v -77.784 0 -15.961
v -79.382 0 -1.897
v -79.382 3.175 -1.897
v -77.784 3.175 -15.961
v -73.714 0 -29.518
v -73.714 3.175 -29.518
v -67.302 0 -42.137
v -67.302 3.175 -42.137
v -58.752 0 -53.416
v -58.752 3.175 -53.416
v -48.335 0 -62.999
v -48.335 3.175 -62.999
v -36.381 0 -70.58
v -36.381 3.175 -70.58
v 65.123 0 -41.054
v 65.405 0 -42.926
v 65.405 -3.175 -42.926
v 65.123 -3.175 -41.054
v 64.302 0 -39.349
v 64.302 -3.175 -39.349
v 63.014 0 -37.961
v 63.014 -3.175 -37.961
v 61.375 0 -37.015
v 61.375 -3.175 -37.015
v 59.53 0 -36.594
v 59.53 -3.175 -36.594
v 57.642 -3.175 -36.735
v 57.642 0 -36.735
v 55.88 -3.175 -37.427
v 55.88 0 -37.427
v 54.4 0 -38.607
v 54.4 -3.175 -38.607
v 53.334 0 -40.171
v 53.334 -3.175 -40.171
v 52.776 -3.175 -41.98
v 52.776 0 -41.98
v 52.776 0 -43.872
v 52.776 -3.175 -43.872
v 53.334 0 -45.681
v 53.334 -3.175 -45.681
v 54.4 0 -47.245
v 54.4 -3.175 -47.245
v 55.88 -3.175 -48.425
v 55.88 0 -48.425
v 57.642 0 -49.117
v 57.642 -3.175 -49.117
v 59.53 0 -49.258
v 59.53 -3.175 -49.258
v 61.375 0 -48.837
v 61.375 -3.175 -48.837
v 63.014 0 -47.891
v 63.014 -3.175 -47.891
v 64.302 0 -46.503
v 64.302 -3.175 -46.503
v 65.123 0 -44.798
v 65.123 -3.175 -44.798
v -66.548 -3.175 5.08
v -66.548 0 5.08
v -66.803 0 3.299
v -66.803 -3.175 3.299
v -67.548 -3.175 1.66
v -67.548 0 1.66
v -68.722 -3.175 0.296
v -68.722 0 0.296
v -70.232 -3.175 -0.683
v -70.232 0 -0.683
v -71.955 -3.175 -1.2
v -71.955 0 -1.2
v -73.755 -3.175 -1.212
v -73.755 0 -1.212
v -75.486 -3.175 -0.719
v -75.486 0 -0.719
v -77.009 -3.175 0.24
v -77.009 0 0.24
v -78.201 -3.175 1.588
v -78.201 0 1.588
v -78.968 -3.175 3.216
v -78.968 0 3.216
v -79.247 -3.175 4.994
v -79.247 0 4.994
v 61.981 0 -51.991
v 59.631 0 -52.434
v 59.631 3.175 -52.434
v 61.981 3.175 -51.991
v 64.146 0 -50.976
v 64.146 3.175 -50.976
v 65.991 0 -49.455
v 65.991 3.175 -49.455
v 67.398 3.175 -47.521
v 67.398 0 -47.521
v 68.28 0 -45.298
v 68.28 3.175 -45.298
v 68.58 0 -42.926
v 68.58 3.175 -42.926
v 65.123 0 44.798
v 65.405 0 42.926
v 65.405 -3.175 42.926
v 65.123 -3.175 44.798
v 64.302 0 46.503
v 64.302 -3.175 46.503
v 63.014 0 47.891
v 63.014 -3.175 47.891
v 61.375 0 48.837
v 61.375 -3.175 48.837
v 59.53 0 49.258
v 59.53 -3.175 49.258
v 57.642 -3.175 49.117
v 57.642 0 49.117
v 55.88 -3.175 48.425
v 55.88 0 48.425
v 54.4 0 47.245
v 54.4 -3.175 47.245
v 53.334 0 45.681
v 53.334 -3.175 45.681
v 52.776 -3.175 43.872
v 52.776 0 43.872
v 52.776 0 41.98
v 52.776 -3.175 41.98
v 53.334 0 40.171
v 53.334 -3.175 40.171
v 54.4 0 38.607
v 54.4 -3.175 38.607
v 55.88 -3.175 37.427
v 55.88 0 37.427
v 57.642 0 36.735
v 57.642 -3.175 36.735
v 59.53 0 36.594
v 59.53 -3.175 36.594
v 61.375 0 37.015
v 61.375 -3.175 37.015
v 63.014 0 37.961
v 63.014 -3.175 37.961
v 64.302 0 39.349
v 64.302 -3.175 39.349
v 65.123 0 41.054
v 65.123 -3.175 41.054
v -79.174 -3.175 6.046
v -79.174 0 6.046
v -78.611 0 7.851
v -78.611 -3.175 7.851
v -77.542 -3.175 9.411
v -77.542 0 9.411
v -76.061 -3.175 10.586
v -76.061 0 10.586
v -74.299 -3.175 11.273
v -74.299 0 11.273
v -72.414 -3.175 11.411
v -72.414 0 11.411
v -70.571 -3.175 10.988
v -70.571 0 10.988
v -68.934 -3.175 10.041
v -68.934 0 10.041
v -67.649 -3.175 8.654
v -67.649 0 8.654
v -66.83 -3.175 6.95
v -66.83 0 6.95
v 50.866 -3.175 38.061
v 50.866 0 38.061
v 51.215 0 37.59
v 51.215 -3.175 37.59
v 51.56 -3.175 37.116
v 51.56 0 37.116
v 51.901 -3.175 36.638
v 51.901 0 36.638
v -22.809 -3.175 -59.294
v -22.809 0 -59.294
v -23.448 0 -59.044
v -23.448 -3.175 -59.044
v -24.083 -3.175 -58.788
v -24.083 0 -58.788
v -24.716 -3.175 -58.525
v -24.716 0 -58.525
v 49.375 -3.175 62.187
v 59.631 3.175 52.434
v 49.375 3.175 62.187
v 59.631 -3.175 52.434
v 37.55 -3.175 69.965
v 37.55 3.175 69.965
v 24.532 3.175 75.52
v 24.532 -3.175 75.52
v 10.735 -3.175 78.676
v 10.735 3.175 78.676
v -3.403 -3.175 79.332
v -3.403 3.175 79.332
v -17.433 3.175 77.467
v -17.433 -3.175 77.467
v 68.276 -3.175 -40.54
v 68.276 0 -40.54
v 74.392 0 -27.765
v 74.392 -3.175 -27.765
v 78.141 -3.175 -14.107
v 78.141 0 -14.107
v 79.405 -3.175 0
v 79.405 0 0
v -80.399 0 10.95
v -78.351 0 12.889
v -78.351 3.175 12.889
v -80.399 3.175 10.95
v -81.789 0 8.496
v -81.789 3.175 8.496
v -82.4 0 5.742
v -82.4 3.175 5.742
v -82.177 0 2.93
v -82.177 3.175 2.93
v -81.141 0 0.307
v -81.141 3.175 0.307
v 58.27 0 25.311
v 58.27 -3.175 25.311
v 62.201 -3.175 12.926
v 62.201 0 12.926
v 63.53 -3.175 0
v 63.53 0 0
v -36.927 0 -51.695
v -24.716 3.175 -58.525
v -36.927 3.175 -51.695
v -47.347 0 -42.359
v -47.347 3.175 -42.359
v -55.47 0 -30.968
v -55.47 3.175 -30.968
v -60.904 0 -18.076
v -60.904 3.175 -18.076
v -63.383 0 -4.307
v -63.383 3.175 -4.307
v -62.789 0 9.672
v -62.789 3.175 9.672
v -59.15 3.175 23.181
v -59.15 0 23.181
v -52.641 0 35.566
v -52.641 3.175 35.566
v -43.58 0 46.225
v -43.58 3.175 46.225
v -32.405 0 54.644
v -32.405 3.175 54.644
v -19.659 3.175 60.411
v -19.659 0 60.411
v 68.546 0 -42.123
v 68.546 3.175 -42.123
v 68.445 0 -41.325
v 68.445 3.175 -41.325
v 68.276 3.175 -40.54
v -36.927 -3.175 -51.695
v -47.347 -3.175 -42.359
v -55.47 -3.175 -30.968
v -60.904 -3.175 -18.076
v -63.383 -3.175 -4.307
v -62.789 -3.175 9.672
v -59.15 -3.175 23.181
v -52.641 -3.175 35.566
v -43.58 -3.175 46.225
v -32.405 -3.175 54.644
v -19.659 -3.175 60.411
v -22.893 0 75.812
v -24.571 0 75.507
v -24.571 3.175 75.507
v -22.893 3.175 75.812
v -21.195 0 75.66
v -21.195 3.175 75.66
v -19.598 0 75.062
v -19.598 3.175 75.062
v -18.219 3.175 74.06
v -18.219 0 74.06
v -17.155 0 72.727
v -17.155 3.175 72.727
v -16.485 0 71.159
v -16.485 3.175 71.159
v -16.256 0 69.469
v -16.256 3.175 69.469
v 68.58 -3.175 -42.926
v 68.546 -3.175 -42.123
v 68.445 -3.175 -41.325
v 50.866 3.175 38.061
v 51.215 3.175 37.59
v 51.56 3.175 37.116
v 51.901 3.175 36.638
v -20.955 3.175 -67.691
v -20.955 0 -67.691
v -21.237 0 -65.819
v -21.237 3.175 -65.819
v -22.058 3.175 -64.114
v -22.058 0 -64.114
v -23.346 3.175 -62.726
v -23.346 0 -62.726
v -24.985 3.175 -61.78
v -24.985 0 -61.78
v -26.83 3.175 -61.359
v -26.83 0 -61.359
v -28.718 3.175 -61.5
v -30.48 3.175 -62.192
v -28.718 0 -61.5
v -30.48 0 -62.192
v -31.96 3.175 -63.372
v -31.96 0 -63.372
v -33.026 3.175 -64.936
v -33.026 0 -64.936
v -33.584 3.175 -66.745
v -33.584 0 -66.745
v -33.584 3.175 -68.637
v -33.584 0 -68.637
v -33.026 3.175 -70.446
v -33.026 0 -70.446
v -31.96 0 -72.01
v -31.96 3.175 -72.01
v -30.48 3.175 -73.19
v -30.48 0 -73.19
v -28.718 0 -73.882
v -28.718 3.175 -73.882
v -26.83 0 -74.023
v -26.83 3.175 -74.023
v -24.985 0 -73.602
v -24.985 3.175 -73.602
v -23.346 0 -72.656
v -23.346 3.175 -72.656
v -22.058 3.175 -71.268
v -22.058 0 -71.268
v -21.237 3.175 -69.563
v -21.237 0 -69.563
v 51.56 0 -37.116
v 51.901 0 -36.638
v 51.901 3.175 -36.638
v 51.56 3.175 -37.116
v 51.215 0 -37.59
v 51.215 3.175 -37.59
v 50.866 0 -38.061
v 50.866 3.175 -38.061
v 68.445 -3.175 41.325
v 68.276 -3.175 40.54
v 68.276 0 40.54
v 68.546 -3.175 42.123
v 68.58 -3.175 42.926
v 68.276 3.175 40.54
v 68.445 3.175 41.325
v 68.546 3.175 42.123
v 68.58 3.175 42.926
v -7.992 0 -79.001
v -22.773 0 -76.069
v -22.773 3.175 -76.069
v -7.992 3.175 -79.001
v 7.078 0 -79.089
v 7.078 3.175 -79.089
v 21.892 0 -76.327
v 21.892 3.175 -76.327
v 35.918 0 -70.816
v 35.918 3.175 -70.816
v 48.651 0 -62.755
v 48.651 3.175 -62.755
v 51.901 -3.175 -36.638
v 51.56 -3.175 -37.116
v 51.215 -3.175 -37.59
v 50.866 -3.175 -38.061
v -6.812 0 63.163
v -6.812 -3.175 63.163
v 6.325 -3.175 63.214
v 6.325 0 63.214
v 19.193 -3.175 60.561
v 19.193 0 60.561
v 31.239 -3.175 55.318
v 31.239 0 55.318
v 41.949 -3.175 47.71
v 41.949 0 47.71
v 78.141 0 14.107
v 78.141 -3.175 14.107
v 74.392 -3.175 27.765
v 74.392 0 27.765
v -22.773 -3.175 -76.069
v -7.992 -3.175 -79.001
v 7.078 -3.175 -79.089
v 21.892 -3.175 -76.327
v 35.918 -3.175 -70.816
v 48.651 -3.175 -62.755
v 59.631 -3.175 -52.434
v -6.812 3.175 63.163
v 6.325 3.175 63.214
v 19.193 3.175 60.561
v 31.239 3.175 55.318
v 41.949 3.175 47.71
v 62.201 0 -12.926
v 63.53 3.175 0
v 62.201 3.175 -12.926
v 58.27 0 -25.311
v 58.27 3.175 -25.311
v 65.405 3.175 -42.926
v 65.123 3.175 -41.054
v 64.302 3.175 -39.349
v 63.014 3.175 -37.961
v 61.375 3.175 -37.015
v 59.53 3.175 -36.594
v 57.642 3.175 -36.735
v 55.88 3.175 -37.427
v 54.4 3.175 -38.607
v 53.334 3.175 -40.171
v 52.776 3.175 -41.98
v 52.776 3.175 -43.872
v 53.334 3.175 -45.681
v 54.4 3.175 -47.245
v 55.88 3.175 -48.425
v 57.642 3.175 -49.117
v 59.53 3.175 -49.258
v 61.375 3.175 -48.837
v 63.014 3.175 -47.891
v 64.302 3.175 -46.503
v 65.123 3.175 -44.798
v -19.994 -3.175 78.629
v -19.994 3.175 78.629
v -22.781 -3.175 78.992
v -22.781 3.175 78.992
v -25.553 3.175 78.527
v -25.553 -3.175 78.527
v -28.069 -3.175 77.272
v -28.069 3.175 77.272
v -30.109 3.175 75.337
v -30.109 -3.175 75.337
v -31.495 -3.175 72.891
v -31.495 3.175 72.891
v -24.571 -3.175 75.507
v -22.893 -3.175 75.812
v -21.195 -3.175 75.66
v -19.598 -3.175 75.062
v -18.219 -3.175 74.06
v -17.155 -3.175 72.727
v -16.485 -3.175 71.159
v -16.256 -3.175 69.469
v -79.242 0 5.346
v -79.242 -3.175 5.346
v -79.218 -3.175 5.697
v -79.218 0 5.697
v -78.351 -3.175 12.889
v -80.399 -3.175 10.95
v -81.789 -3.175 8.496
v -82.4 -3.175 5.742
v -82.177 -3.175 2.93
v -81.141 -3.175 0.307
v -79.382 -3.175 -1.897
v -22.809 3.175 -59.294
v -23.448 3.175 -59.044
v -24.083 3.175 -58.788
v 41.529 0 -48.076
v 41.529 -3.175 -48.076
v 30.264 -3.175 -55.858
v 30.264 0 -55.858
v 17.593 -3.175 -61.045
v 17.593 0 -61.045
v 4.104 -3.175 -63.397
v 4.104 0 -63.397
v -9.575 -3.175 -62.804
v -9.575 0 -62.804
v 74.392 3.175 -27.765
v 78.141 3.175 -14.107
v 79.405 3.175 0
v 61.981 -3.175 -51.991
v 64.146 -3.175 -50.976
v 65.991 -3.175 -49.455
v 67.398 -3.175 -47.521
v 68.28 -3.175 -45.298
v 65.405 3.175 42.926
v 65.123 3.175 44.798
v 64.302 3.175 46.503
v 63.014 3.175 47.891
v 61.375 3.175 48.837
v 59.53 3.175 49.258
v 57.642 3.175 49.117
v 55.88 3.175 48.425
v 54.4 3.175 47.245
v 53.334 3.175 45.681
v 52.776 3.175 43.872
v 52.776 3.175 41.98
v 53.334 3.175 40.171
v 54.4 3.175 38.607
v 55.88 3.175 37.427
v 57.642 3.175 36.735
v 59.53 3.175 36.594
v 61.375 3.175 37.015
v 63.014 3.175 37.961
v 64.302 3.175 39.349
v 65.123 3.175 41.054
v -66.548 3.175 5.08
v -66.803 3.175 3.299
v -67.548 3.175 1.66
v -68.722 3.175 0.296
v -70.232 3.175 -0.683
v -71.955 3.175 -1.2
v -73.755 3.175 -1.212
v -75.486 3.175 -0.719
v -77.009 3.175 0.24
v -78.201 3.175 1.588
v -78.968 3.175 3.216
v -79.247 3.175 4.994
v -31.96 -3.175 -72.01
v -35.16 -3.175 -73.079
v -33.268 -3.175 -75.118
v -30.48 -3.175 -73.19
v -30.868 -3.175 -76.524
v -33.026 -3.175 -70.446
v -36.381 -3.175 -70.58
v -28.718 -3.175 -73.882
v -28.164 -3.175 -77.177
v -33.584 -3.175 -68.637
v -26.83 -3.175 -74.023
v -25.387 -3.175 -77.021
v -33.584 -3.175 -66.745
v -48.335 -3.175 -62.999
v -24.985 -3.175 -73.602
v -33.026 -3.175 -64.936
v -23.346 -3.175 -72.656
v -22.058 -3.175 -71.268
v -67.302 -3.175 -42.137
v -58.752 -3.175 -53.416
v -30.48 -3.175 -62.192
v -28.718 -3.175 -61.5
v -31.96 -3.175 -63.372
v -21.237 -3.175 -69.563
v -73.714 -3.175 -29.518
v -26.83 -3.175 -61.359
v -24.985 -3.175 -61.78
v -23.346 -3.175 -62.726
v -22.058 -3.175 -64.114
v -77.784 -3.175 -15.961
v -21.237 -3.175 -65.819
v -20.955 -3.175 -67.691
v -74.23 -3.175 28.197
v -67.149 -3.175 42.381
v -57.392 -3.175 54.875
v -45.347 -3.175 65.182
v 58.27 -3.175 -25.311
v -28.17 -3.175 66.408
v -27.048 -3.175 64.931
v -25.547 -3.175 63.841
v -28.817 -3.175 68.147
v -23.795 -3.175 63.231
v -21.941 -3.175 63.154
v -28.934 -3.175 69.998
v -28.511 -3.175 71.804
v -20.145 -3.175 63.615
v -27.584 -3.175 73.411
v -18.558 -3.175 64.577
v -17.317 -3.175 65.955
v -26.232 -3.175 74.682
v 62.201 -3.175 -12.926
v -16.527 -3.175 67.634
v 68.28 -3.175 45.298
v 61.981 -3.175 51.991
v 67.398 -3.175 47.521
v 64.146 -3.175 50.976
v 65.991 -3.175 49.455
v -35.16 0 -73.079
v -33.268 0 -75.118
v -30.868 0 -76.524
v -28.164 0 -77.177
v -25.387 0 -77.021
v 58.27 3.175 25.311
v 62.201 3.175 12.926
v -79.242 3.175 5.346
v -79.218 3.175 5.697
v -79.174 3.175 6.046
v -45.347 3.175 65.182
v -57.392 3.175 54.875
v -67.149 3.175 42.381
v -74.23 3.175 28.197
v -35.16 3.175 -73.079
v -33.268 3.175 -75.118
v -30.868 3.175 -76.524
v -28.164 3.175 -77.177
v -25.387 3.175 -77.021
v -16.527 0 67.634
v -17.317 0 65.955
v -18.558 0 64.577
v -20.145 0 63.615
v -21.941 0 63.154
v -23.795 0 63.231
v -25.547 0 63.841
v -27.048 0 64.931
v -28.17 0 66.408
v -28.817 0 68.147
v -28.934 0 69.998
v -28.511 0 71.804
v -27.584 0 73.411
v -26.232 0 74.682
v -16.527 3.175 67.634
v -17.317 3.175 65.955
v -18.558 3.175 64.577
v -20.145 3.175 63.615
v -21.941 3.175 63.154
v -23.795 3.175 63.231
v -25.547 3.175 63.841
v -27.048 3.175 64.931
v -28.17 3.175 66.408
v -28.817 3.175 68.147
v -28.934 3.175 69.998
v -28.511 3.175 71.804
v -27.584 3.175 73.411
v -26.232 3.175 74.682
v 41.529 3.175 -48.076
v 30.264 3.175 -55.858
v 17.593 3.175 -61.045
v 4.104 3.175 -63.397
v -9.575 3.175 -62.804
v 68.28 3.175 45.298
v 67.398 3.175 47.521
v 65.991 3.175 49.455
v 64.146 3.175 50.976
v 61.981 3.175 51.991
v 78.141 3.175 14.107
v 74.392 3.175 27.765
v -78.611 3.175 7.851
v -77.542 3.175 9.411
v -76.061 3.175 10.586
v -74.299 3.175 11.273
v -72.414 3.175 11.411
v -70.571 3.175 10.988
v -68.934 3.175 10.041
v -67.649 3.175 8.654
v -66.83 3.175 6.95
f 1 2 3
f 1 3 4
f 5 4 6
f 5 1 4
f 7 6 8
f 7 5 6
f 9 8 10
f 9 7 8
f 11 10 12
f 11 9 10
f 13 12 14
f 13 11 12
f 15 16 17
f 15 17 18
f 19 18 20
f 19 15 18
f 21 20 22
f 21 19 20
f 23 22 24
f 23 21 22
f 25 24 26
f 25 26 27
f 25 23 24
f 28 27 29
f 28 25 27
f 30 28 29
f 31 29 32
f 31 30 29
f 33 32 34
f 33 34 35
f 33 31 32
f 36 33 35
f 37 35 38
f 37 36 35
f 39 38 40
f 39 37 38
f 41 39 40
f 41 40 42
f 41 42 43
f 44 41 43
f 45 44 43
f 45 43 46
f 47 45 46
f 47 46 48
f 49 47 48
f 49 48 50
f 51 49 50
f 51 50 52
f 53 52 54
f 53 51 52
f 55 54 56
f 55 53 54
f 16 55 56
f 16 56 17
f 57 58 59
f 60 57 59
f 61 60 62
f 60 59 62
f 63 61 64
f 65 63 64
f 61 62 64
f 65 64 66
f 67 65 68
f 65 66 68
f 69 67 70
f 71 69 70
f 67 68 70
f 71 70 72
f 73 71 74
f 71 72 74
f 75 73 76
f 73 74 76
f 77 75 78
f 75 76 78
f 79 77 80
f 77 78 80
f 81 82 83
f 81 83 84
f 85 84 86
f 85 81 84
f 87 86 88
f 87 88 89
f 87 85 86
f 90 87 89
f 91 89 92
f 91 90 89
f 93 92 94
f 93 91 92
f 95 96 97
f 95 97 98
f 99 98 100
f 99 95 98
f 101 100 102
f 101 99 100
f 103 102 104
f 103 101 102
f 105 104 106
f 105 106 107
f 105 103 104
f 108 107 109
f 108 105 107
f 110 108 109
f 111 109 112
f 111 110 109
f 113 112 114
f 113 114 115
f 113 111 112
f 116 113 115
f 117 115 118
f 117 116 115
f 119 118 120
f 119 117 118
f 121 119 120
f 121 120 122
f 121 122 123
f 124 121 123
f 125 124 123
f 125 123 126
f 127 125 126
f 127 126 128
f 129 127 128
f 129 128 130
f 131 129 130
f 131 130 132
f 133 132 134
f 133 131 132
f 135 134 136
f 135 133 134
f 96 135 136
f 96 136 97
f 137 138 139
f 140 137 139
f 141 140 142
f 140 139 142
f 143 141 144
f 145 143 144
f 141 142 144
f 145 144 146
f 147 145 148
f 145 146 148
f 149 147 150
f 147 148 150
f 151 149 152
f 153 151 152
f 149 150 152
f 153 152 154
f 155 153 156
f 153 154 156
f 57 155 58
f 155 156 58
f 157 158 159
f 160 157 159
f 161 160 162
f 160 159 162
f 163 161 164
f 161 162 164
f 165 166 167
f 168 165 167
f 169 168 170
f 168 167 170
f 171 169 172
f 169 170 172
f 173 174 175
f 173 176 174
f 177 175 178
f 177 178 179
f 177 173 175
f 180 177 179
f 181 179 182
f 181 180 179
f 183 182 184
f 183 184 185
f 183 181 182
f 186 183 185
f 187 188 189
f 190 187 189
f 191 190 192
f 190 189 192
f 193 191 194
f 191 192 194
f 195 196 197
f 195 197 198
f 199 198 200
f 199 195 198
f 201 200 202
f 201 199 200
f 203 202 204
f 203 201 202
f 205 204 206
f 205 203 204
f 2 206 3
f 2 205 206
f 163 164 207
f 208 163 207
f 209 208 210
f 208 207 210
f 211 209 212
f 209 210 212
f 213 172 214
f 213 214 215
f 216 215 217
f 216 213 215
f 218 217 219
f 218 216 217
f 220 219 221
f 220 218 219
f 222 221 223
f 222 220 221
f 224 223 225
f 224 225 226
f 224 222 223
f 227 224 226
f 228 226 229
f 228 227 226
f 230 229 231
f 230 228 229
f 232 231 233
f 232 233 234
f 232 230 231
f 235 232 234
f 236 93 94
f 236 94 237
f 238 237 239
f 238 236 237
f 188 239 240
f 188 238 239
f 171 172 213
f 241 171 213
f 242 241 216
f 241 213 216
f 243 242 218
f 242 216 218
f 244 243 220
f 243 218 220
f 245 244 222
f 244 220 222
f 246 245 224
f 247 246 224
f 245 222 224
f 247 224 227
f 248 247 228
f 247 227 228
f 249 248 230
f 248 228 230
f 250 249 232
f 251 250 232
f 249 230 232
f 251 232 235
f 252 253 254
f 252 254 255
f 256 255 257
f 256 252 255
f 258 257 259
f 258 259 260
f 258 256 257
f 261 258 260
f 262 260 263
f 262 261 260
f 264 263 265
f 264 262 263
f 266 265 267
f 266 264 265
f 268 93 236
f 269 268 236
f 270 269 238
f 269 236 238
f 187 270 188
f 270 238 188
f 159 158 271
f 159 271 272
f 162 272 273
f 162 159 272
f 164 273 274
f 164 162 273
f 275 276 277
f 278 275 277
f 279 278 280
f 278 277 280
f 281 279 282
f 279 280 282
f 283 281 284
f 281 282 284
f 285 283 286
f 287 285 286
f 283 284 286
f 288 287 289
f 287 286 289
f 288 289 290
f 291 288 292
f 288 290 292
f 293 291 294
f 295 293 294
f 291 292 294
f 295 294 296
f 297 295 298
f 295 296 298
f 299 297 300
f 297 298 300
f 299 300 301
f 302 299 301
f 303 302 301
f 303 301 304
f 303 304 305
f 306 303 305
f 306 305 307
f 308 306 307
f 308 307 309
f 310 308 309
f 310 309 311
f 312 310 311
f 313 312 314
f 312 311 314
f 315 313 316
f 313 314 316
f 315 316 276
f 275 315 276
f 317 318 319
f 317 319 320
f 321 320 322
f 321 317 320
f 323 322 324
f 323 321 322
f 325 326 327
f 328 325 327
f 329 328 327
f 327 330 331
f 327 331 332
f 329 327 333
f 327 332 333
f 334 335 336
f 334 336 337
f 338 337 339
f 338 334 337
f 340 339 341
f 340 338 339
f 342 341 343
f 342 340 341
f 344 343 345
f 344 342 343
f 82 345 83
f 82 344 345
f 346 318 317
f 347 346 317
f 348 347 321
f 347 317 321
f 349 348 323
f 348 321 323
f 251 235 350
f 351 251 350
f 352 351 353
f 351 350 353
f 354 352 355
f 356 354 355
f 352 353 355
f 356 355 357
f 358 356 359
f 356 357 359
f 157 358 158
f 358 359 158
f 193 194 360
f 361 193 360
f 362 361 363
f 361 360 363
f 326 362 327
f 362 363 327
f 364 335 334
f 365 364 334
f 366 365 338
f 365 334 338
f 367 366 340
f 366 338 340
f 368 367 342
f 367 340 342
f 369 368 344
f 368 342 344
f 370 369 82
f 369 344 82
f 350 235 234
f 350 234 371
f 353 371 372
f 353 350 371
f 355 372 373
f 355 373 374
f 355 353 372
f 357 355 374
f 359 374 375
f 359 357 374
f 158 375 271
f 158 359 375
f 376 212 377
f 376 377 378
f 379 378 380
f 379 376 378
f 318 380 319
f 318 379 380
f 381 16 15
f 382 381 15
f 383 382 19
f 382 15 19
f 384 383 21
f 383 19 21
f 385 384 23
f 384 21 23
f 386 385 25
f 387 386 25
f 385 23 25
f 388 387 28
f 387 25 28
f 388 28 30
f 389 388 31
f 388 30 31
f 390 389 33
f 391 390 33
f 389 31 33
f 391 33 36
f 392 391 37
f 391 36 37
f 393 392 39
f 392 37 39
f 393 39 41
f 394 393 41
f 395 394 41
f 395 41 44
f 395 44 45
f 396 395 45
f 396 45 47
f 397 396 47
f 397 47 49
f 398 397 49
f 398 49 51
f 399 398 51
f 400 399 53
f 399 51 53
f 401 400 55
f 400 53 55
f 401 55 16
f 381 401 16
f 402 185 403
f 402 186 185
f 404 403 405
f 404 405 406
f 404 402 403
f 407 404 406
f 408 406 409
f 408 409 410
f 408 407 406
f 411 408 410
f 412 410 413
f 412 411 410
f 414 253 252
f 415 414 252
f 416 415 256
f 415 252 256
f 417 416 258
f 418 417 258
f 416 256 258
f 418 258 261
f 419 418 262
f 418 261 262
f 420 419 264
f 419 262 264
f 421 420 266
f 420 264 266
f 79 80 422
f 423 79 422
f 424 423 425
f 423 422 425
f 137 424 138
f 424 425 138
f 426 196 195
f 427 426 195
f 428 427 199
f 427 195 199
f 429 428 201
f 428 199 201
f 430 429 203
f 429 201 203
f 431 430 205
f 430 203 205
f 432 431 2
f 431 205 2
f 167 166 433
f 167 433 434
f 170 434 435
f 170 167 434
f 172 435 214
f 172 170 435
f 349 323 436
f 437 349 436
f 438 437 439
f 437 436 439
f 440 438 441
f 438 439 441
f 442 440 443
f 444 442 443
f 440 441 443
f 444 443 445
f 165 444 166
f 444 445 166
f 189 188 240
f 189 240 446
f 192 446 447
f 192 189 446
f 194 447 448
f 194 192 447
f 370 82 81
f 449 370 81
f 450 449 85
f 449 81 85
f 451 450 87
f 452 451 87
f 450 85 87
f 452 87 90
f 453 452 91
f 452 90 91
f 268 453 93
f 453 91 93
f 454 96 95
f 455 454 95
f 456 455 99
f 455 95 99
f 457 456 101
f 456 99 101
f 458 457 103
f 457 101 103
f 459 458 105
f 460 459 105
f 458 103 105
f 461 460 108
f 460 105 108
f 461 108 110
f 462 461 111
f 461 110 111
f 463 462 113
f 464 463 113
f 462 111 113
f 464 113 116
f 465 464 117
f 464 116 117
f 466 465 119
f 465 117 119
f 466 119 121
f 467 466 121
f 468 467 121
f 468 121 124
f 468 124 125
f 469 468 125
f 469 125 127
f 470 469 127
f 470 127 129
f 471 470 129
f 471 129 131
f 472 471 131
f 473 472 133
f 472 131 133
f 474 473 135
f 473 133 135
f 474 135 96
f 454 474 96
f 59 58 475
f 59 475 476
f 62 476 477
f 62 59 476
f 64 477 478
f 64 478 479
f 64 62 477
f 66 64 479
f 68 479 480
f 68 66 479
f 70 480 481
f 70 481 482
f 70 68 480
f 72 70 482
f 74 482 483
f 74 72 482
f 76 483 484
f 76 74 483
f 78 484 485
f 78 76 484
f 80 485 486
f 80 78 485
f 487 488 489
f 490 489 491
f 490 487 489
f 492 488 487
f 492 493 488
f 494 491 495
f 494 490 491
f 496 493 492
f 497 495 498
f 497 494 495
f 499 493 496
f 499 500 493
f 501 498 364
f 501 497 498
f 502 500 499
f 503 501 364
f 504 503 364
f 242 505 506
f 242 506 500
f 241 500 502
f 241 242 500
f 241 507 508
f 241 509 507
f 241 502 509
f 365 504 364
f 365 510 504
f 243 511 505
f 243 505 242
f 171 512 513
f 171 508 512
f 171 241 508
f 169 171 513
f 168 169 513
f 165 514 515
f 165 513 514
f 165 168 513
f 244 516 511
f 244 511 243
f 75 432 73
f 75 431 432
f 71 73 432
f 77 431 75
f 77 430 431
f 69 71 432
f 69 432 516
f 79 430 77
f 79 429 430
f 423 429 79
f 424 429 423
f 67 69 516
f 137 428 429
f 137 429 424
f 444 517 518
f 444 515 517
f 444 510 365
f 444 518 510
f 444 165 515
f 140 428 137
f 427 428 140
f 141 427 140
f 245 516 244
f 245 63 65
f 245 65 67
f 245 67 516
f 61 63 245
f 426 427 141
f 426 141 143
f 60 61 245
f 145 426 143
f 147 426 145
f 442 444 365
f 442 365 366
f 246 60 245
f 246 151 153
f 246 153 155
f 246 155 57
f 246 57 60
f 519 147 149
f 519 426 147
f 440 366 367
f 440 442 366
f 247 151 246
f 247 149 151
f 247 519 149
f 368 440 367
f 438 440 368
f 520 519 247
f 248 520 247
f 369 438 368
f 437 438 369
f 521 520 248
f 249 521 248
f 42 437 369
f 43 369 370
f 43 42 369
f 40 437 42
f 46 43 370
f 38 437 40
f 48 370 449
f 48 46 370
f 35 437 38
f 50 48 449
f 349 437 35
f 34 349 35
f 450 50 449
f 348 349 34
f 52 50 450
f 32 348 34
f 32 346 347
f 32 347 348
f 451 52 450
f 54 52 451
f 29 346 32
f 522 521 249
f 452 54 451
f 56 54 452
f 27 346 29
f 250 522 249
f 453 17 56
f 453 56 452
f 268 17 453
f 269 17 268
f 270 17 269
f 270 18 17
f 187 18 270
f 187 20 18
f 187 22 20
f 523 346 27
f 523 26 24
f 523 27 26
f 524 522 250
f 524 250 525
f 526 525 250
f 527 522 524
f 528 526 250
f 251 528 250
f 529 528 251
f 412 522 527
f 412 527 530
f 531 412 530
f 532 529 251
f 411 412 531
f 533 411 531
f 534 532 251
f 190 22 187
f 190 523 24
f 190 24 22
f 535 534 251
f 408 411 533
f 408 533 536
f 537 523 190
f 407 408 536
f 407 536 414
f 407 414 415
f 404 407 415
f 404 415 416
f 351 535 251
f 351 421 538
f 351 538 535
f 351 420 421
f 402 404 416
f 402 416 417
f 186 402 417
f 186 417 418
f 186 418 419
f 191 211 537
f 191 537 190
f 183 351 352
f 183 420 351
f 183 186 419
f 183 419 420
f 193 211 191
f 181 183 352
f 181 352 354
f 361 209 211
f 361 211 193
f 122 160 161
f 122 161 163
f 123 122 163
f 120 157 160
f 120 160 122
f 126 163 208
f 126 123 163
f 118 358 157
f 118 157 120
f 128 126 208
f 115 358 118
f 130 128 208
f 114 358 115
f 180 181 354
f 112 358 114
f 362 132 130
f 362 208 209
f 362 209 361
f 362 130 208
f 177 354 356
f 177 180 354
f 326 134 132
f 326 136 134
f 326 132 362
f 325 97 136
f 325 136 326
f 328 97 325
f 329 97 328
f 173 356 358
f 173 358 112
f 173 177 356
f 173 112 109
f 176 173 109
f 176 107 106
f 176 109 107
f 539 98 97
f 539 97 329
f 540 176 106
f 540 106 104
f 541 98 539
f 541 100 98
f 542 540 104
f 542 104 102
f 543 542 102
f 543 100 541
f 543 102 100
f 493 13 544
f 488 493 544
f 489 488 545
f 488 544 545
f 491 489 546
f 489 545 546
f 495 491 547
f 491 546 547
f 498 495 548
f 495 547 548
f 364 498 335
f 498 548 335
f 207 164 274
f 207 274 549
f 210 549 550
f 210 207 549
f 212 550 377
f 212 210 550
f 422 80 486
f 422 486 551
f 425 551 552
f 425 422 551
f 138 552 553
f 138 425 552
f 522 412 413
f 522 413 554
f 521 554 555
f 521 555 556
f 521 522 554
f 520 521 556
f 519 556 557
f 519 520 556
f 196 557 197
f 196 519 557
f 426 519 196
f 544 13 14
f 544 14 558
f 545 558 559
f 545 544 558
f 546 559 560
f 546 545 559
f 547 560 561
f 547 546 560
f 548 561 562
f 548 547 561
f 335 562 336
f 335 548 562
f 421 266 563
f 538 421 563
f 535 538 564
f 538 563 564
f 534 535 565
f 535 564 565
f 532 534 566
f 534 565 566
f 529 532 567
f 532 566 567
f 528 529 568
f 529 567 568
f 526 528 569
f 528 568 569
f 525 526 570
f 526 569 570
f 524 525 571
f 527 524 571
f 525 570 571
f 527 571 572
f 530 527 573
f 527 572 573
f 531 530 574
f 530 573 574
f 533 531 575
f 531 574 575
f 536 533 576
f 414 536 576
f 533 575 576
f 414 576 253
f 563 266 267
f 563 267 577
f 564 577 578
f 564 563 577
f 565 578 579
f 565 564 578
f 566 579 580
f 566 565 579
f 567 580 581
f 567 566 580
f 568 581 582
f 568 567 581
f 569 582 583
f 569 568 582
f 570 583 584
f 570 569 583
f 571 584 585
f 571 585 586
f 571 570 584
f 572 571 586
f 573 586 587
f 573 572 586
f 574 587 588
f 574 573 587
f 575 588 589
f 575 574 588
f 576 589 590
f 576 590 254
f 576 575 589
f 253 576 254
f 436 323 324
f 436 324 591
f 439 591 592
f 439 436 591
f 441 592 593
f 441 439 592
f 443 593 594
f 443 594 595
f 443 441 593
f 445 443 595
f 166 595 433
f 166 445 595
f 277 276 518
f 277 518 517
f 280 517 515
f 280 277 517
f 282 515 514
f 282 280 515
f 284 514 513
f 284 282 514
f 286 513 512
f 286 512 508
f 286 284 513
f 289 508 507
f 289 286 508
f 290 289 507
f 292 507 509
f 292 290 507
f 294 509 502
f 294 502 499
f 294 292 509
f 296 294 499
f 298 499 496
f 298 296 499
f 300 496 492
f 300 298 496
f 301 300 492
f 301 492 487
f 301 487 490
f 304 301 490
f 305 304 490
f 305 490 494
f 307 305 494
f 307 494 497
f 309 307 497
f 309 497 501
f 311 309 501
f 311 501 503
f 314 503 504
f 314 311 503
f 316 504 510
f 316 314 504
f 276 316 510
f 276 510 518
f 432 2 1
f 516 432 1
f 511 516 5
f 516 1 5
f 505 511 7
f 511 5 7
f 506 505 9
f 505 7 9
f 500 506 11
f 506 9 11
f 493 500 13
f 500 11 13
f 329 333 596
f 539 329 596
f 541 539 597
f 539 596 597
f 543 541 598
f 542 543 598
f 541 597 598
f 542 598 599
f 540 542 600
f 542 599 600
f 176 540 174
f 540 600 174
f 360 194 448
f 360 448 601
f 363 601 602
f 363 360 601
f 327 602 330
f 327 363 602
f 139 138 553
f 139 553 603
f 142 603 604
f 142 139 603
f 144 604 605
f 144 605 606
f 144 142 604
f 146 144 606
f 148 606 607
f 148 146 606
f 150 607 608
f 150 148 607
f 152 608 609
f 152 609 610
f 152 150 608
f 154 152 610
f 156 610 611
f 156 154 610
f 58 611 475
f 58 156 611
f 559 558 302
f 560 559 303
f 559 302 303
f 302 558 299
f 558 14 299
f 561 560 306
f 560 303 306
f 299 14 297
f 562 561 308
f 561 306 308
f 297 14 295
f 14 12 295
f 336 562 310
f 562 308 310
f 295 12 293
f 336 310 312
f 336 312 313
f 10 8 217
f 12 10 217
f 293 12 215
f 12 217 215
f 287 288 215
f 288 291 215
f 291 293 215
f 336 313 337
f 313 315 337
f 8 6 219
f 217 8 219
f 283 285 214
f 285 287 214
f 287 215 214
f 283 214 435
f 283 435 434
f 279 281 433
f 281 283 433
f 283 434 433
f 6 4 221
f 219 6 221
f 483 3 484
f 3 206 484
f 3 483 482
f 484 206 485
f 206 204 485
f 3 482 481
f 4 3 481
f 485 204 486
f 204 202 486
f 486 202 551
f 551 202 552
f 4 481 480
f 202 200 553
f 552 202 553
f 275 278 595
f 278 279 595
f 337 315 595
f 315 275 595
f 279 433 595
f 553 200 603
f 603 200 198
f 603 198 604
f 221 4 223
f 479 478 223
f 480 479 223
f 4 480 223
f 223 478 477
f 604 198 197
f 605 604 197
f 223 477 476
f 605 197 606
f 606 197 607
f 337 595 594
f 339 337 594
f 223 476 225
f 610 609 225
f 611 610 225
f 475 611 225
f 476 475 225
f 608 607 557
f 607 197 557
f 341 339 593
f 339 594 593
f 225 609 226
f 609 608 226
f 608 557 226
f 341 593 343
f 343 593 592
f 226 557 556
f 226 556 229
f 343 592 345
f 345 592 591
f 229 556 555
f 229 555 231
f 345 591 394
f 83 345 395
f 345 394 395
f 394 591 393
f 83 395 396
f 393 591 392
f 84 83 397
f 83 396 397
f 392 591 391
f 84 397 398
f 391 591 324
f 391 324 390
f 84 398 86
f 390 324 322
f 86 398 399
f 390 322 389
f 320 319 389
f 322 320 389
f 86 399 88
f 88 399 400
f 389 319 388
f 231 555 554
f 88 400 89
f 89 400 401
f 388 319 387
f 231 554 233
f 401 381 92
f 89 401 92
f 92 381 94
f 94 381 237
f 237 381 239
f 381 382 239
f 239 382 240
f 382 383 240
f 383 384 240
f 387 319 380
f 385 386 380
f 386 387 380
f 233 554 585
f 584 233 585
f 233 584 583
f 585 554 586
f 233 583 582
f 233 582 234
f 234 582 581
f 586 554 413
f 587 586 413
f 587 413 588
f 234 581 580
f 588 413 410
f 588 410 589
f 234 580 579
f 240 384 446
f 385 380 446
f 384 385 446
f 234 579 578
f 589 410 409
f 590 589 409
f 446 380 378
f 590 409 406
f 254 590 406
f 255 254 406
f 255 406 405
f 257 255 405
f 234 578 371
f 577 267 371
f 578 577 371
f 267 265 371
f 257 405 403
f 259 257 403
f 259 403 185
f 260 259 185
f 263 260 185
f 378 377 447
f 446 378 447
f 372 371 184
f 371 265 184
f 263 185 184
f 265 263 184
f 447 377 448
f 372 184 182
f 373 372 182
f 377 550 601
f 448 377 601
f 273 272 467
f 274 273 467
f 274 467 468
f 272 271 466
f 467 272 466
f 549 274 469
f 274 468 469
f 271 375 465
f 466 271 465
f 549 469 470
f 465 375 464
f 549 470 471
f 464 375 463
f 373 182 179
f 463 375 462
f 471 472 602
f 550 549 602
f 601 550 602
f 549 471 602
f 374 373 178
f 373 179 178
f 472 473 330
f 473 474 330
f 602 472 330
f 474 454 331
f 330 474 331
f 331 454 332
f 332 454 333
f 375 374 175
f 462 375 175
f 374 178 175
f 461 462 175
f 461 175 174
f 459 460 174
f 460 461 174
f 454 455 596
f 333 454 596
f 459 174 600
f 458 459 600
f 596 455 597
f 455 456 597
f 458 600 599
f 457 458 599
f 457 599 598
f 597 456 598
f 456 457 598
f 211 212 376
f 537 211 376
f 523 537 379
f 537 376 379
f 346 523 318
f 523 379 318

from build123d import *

# Parameters (mm, degrees)
F0_R     = 6.35
F1_DEPTH = 3.175


with BuildPart() as f1:
    # F0 (on Front) → F1 (new body, symmetric)
    with BuildSketch(Plane.XZ):
        with BuildLine():
            ThreePointArc((-17.4334869568, 77.4671706545), (-21.0250628511, 76.5704625087), (-24.5709427988, 75.5073358467))
            ThreePointArc((-24.5709427988, 75.5073358467), (-28.0634202853, 74.2801012289), (-31.4949046301, 72.8914259638))
            ThreePointArc((-31.4949046301, 72.8914259638), (-29.5170408255, 62.9143726492), (-19.6585851248, 60.4114964503))
            ThreePointArc((-19.6585851248, 60.4114964503), (-14.8988685075, 63.8720589464), (-13.081, 69.469))
            ThreePointArc((-13.081, 69.469), (-14.2395846465, 74.0218803116), (-17.4334869568, 77.4671706545))
        make_face()
        with BuildLine():
            ThreePointArc((-24.5709427988, 75.5073358467), (-18.8747057723, 74.6070875222), (-16.256, 69.469))
            ThreePointArc((-16.256, 69.469), (-26.3372942277, 64.3309124778), (-24.5709427988, 75.5073358467))
        make_face(mode=Mode.SUBTRACT)
        with BuildLine():
            ThreePointArc((-31.4949046301, 72.8914259638), (-28.0634202853, 74.2801012289), (-24.5709427988, 75.5073358467))
            ThreePointArc((-24.5709427988, 75.5073358467), (-21.0250628511, 76.5704625087), (-17.4334869568, 77.4671706545))
            ThreePointArc((-17.4334869568, 77.4671706545), (-25.5534143712, 78.5265037137), (-31.4949046301, 72.8914259638))
        make_face()
        with BuildLine():
            ThreePointArc((59.6305906851, 52.4335927744), (24.5319973939, 75.5199980174), (-17.4334869568, 77.4671706545))
            ThreePointArc((-17.4334869568, 77.4671706545), (-14.2395846465, 74.0218803116), (-13.081, 69.469))
            ThreePointArc((-13.081, 69.469), (-14.8988685075, 63.8720589464), (-19.6585851248, 60.4114964503))
            ThreePointArc((-19.6585851248, 60.4114964503), (19.192650723, 60.561134655), (50.8659607408, 38.0613046332))
            ThreePointArc((50.8659607408, 38.0613046332), (50.9228529034, 47.8852145144), (59.6305906851, 52.4335927744))
        make_face()
        with BuildLine():
            ThreePointArc((-19.6585851248, 60.4114964503), (-29.5170408255, 62.9143726492), (-31.4949046301, 72.8914259638))
            ThreePointArc((-31.4949046301, 72.8914259638), (-62.5829136435, 48.8719542947), (-78.3514836066, 12.8892984033))
            ThreePointArc((-78.3514836066, 12.8892984033), (-68.4945244609, 13.5260066408), (-63.373, 5.08))
            ThreePointArc((-63.373, 5.08), (-69.0923257109, -3.6516933183), (-79.3819172084, -1.8974237821))
            ThreePointArc((-79.3819172084, -1.8974237821), (-67.3022929991, -42.1365678923), (-36.3814305576, -70.5796040459))
            ThreePointArc((-36.3814305576, -70.5796040459), (-34.1498428756, -61.0672736312), (-24.7158919074, -58.5246406199))
            ThreePointArc((-24.7158919074, -58.5246406199), (-63.4722358852, 2.6989153756), (-19.6585851248, 60.4114964503))
        make_face()
        with BuildLine():
            ThreePointArc((68.58, 42.926), (65.9907092743, 49.4545191171), (59.6305906851, 52.4335927744))
            ThreePointArc((59.6305906851, 52.4335927744), (64.2293016822, 46.6871053087), (68.276185728, 40.5395049195))
            ThreePointArc((68.276185728, 40.5395049195), (68.5037411611, 41.7231220052), (68.58, 42.926))
        make_face()
        with BuildLine():
            ThreePointArc((68.276185728, 40.5395049195), (64.2293016822, 46.6871053087), (59.6305906851, 52.4335927744))
            ThreePointArc((59.6305906851, 52.4335927744), (50.9228529034, 47.8852145144), (50.8659607408, 38.0613046332))
            ThreePointArc((50.8659607408, 38.0613046332), (51.3882284212, 37.3531638847), (51.9006383071, 36.6378576855))
            ThreePointArc((51.9006383071, 36.6378576855), (61.2626352015, 33.6603660866), (68.276185728, 40.5395049195))
        make_face()
        with Locations((59.055, 42.926)):
            Circle(F0_R, mode=Mode.SUBTRACT)
        with BuildLine():
            ThreePointArc((-63.373, 5.08), (-68.4945244609, 13.5260066408), (-78.3514836066, 12.8892984033))
            ThreePointArc((-78.3514836066, 12.8892984033), (-78.8370586265, 9.4766652265), (-79.1740663586, 6.0461734122))
            ThreePointArc((-79.1740663586, 6.0461734122), (-72.4135009686, 11.4114896106), (-66.548, 5.08))
            ThreePointArc((-66.548, 5.08), (-72.8548244643, -1.2698532167), (-79.2474128734, 4.9936509246))
            ThreePointArc((-79.2474128734, 4.9936509246), (-79.3894691896, 1.5495736457), (-79.3819172084, -1.8974237821))
            ThreePointArc((-79.3819172084, -1.8974237821), (-69.0923257109, -3.6516933183), (-63.373, 5.08))
        make_face()
        with BuildLine():
            ThreePointArc((-79.1740663586, 6.0461734122), (-78.8370586265, 9.4766652265), (-78.3514836066, 12.8892984033))
            ThreePointArc((-78.3514836066, 12.8892984033), (-82.3999562618, 5.7421572308), (-79.3819172084, -1.8974237821))
            ThreePointArc((-79.3819172084, -1.8974237821), (-79.3894691896, 1.5495736457), (-79.2474128734, 4.9936509246))
            ThreePointArc((-79.2474128734, 4.9936509246), (-79.2326375079, 5.5214381539), (-79.1740663586, 6.0461734122))
        make_face()
        with BuildLine():
            ThreePointArc((79.4045905265, 0), (76.5719647362, 21.0195911739), (68.276185728, 40.5395049195))
            ThreePointArc((68.276185728, 40.5395049195), (61.2626352015, 33.6603660866), (51.9006383071, 36.6378576855))
            ThreePointArc((51.9006383071, 36.6378576855), (60.5526018111, 19.2195547913), (63.5295905265, 0))
            ThreePointArc((63.5295905265, 0), (60.5526018111, -19.2195547913), (51.9006383071, -36.6378576855))
            ThreePointArc((51.9006383071, -36.6378576855), (61.2626352015, -33.6603660866), (68.276185728, -40.5395049195))
            ThreePointArc((68.276185728, -40.5395049195), (76.5719647362, -21.0195911739), (79.4045905265, 0))
        make_face()
        with BuildLine():
            ThreePointArc((-22.8093313363, -59.2937035145), (-23.7657227015, -58.9168846507), (-24.7158919074, -58.5246406199))
            ThreePointArc((-24.7158919074, -58.5246406199), (-34.1498428756, -61.0672736312), (-36.3814305576, -70.5796040459))
            ThreePointArc((-36.3814305576, -70.5796040459), (-29.7043860041, -73.6392453031), (-22.7732002069, -76.0688526864))
            ThreePointArc((-22.7732002069, -76.0688526864), (-19.1229764719, -72.5674860284), (-17.78, -67.691))
            ThreePointArc((-17.78, -67.691), (-19.1334986379, -62.7969024847), (-22.8093313363, -59.2937035145))
        make_face()
        with Locations((-27.305, -67.691)):
            Circle(F0_R, mode=Mode.SUBTRACT)
        with BuildLine():
            ThreePointArc((-22.7732002069, -76.0688526864), (-29.7043860041, -73.6392453031), (-36.3814305576, -70.5796040459))
            ThreePointArc((-36.3814305576, -70.5796040459), (-30.8681979815, -76.5244163914), (-22.7732002069, -76.0688526864))
        make_face()
        with BuildLine():
            ThreePointArc((50.8659607408, -38.0613046332), (17.5925354611, -61.0451600745), (-22.8093313363, -59.2937035145))
            ThreePointArc((-22.8093313363, -59.2937035145), (-19.1334986379, -62.7969024847), (-17.78, -67.691))
            ThreePointArc((-17.78, -67.691), (-19.1229764719, -72.5674860284), (-22.7732002069, -76.0688526864))
            ThreePointArc((-22.7732002069, -76.0688526864), (21.892308832, -76.3270319788), (59.6305906851, -52.4335927744))
            ThreePointArc((59.6305906851, -52.4335927744), (50.9228529034, -47.8852145144), (50.8659607408, -38.0613046332))
        make_face()
        with BuildLine():
            ThreePointArc((68.58, -42.926), (68.5037411611, -41.7231220052), (68.276185728, -40.5395049195))
            ThreePointArc((68.276185728, -40.5395049195), (64.2293016822, -46.6871053087), (59.6305906851, -52.4335927744))
            ThreePointArc((59.6305906851, -52.4335927744), (65.9907092743, -49.4545191171), (68.58, -42.926))
        make_face()
        with BuildLine():
            ThreePointArc((59.6305906851, -52.4335927744), (64.2293016822, -46.6871053087), (68.276185728, -40.5395049195))
            ThreePointArc((68.276185728, -40.5395049195), (61.2626352015, -33.6603660866), (51.9006383071, -36.6378576855))
            ThreePointArc((51.9006383071, -36.6378576855), (51.3882284212, -37.3531638847), (50.8659607408, -38.0613046332))
            ThreePointArc((50.8659607408, -38.0613046332), (50.9228529034, -47.8852145144), (59.6305906851, -52.4335927744))
        make_face()
        with Locations((59.055, -42.926)):
            Circle(F0_R, mode=Mode.SUBTRACT)
    extrude(amount=F1_DEPTH, both=True)


solid = f1.part
